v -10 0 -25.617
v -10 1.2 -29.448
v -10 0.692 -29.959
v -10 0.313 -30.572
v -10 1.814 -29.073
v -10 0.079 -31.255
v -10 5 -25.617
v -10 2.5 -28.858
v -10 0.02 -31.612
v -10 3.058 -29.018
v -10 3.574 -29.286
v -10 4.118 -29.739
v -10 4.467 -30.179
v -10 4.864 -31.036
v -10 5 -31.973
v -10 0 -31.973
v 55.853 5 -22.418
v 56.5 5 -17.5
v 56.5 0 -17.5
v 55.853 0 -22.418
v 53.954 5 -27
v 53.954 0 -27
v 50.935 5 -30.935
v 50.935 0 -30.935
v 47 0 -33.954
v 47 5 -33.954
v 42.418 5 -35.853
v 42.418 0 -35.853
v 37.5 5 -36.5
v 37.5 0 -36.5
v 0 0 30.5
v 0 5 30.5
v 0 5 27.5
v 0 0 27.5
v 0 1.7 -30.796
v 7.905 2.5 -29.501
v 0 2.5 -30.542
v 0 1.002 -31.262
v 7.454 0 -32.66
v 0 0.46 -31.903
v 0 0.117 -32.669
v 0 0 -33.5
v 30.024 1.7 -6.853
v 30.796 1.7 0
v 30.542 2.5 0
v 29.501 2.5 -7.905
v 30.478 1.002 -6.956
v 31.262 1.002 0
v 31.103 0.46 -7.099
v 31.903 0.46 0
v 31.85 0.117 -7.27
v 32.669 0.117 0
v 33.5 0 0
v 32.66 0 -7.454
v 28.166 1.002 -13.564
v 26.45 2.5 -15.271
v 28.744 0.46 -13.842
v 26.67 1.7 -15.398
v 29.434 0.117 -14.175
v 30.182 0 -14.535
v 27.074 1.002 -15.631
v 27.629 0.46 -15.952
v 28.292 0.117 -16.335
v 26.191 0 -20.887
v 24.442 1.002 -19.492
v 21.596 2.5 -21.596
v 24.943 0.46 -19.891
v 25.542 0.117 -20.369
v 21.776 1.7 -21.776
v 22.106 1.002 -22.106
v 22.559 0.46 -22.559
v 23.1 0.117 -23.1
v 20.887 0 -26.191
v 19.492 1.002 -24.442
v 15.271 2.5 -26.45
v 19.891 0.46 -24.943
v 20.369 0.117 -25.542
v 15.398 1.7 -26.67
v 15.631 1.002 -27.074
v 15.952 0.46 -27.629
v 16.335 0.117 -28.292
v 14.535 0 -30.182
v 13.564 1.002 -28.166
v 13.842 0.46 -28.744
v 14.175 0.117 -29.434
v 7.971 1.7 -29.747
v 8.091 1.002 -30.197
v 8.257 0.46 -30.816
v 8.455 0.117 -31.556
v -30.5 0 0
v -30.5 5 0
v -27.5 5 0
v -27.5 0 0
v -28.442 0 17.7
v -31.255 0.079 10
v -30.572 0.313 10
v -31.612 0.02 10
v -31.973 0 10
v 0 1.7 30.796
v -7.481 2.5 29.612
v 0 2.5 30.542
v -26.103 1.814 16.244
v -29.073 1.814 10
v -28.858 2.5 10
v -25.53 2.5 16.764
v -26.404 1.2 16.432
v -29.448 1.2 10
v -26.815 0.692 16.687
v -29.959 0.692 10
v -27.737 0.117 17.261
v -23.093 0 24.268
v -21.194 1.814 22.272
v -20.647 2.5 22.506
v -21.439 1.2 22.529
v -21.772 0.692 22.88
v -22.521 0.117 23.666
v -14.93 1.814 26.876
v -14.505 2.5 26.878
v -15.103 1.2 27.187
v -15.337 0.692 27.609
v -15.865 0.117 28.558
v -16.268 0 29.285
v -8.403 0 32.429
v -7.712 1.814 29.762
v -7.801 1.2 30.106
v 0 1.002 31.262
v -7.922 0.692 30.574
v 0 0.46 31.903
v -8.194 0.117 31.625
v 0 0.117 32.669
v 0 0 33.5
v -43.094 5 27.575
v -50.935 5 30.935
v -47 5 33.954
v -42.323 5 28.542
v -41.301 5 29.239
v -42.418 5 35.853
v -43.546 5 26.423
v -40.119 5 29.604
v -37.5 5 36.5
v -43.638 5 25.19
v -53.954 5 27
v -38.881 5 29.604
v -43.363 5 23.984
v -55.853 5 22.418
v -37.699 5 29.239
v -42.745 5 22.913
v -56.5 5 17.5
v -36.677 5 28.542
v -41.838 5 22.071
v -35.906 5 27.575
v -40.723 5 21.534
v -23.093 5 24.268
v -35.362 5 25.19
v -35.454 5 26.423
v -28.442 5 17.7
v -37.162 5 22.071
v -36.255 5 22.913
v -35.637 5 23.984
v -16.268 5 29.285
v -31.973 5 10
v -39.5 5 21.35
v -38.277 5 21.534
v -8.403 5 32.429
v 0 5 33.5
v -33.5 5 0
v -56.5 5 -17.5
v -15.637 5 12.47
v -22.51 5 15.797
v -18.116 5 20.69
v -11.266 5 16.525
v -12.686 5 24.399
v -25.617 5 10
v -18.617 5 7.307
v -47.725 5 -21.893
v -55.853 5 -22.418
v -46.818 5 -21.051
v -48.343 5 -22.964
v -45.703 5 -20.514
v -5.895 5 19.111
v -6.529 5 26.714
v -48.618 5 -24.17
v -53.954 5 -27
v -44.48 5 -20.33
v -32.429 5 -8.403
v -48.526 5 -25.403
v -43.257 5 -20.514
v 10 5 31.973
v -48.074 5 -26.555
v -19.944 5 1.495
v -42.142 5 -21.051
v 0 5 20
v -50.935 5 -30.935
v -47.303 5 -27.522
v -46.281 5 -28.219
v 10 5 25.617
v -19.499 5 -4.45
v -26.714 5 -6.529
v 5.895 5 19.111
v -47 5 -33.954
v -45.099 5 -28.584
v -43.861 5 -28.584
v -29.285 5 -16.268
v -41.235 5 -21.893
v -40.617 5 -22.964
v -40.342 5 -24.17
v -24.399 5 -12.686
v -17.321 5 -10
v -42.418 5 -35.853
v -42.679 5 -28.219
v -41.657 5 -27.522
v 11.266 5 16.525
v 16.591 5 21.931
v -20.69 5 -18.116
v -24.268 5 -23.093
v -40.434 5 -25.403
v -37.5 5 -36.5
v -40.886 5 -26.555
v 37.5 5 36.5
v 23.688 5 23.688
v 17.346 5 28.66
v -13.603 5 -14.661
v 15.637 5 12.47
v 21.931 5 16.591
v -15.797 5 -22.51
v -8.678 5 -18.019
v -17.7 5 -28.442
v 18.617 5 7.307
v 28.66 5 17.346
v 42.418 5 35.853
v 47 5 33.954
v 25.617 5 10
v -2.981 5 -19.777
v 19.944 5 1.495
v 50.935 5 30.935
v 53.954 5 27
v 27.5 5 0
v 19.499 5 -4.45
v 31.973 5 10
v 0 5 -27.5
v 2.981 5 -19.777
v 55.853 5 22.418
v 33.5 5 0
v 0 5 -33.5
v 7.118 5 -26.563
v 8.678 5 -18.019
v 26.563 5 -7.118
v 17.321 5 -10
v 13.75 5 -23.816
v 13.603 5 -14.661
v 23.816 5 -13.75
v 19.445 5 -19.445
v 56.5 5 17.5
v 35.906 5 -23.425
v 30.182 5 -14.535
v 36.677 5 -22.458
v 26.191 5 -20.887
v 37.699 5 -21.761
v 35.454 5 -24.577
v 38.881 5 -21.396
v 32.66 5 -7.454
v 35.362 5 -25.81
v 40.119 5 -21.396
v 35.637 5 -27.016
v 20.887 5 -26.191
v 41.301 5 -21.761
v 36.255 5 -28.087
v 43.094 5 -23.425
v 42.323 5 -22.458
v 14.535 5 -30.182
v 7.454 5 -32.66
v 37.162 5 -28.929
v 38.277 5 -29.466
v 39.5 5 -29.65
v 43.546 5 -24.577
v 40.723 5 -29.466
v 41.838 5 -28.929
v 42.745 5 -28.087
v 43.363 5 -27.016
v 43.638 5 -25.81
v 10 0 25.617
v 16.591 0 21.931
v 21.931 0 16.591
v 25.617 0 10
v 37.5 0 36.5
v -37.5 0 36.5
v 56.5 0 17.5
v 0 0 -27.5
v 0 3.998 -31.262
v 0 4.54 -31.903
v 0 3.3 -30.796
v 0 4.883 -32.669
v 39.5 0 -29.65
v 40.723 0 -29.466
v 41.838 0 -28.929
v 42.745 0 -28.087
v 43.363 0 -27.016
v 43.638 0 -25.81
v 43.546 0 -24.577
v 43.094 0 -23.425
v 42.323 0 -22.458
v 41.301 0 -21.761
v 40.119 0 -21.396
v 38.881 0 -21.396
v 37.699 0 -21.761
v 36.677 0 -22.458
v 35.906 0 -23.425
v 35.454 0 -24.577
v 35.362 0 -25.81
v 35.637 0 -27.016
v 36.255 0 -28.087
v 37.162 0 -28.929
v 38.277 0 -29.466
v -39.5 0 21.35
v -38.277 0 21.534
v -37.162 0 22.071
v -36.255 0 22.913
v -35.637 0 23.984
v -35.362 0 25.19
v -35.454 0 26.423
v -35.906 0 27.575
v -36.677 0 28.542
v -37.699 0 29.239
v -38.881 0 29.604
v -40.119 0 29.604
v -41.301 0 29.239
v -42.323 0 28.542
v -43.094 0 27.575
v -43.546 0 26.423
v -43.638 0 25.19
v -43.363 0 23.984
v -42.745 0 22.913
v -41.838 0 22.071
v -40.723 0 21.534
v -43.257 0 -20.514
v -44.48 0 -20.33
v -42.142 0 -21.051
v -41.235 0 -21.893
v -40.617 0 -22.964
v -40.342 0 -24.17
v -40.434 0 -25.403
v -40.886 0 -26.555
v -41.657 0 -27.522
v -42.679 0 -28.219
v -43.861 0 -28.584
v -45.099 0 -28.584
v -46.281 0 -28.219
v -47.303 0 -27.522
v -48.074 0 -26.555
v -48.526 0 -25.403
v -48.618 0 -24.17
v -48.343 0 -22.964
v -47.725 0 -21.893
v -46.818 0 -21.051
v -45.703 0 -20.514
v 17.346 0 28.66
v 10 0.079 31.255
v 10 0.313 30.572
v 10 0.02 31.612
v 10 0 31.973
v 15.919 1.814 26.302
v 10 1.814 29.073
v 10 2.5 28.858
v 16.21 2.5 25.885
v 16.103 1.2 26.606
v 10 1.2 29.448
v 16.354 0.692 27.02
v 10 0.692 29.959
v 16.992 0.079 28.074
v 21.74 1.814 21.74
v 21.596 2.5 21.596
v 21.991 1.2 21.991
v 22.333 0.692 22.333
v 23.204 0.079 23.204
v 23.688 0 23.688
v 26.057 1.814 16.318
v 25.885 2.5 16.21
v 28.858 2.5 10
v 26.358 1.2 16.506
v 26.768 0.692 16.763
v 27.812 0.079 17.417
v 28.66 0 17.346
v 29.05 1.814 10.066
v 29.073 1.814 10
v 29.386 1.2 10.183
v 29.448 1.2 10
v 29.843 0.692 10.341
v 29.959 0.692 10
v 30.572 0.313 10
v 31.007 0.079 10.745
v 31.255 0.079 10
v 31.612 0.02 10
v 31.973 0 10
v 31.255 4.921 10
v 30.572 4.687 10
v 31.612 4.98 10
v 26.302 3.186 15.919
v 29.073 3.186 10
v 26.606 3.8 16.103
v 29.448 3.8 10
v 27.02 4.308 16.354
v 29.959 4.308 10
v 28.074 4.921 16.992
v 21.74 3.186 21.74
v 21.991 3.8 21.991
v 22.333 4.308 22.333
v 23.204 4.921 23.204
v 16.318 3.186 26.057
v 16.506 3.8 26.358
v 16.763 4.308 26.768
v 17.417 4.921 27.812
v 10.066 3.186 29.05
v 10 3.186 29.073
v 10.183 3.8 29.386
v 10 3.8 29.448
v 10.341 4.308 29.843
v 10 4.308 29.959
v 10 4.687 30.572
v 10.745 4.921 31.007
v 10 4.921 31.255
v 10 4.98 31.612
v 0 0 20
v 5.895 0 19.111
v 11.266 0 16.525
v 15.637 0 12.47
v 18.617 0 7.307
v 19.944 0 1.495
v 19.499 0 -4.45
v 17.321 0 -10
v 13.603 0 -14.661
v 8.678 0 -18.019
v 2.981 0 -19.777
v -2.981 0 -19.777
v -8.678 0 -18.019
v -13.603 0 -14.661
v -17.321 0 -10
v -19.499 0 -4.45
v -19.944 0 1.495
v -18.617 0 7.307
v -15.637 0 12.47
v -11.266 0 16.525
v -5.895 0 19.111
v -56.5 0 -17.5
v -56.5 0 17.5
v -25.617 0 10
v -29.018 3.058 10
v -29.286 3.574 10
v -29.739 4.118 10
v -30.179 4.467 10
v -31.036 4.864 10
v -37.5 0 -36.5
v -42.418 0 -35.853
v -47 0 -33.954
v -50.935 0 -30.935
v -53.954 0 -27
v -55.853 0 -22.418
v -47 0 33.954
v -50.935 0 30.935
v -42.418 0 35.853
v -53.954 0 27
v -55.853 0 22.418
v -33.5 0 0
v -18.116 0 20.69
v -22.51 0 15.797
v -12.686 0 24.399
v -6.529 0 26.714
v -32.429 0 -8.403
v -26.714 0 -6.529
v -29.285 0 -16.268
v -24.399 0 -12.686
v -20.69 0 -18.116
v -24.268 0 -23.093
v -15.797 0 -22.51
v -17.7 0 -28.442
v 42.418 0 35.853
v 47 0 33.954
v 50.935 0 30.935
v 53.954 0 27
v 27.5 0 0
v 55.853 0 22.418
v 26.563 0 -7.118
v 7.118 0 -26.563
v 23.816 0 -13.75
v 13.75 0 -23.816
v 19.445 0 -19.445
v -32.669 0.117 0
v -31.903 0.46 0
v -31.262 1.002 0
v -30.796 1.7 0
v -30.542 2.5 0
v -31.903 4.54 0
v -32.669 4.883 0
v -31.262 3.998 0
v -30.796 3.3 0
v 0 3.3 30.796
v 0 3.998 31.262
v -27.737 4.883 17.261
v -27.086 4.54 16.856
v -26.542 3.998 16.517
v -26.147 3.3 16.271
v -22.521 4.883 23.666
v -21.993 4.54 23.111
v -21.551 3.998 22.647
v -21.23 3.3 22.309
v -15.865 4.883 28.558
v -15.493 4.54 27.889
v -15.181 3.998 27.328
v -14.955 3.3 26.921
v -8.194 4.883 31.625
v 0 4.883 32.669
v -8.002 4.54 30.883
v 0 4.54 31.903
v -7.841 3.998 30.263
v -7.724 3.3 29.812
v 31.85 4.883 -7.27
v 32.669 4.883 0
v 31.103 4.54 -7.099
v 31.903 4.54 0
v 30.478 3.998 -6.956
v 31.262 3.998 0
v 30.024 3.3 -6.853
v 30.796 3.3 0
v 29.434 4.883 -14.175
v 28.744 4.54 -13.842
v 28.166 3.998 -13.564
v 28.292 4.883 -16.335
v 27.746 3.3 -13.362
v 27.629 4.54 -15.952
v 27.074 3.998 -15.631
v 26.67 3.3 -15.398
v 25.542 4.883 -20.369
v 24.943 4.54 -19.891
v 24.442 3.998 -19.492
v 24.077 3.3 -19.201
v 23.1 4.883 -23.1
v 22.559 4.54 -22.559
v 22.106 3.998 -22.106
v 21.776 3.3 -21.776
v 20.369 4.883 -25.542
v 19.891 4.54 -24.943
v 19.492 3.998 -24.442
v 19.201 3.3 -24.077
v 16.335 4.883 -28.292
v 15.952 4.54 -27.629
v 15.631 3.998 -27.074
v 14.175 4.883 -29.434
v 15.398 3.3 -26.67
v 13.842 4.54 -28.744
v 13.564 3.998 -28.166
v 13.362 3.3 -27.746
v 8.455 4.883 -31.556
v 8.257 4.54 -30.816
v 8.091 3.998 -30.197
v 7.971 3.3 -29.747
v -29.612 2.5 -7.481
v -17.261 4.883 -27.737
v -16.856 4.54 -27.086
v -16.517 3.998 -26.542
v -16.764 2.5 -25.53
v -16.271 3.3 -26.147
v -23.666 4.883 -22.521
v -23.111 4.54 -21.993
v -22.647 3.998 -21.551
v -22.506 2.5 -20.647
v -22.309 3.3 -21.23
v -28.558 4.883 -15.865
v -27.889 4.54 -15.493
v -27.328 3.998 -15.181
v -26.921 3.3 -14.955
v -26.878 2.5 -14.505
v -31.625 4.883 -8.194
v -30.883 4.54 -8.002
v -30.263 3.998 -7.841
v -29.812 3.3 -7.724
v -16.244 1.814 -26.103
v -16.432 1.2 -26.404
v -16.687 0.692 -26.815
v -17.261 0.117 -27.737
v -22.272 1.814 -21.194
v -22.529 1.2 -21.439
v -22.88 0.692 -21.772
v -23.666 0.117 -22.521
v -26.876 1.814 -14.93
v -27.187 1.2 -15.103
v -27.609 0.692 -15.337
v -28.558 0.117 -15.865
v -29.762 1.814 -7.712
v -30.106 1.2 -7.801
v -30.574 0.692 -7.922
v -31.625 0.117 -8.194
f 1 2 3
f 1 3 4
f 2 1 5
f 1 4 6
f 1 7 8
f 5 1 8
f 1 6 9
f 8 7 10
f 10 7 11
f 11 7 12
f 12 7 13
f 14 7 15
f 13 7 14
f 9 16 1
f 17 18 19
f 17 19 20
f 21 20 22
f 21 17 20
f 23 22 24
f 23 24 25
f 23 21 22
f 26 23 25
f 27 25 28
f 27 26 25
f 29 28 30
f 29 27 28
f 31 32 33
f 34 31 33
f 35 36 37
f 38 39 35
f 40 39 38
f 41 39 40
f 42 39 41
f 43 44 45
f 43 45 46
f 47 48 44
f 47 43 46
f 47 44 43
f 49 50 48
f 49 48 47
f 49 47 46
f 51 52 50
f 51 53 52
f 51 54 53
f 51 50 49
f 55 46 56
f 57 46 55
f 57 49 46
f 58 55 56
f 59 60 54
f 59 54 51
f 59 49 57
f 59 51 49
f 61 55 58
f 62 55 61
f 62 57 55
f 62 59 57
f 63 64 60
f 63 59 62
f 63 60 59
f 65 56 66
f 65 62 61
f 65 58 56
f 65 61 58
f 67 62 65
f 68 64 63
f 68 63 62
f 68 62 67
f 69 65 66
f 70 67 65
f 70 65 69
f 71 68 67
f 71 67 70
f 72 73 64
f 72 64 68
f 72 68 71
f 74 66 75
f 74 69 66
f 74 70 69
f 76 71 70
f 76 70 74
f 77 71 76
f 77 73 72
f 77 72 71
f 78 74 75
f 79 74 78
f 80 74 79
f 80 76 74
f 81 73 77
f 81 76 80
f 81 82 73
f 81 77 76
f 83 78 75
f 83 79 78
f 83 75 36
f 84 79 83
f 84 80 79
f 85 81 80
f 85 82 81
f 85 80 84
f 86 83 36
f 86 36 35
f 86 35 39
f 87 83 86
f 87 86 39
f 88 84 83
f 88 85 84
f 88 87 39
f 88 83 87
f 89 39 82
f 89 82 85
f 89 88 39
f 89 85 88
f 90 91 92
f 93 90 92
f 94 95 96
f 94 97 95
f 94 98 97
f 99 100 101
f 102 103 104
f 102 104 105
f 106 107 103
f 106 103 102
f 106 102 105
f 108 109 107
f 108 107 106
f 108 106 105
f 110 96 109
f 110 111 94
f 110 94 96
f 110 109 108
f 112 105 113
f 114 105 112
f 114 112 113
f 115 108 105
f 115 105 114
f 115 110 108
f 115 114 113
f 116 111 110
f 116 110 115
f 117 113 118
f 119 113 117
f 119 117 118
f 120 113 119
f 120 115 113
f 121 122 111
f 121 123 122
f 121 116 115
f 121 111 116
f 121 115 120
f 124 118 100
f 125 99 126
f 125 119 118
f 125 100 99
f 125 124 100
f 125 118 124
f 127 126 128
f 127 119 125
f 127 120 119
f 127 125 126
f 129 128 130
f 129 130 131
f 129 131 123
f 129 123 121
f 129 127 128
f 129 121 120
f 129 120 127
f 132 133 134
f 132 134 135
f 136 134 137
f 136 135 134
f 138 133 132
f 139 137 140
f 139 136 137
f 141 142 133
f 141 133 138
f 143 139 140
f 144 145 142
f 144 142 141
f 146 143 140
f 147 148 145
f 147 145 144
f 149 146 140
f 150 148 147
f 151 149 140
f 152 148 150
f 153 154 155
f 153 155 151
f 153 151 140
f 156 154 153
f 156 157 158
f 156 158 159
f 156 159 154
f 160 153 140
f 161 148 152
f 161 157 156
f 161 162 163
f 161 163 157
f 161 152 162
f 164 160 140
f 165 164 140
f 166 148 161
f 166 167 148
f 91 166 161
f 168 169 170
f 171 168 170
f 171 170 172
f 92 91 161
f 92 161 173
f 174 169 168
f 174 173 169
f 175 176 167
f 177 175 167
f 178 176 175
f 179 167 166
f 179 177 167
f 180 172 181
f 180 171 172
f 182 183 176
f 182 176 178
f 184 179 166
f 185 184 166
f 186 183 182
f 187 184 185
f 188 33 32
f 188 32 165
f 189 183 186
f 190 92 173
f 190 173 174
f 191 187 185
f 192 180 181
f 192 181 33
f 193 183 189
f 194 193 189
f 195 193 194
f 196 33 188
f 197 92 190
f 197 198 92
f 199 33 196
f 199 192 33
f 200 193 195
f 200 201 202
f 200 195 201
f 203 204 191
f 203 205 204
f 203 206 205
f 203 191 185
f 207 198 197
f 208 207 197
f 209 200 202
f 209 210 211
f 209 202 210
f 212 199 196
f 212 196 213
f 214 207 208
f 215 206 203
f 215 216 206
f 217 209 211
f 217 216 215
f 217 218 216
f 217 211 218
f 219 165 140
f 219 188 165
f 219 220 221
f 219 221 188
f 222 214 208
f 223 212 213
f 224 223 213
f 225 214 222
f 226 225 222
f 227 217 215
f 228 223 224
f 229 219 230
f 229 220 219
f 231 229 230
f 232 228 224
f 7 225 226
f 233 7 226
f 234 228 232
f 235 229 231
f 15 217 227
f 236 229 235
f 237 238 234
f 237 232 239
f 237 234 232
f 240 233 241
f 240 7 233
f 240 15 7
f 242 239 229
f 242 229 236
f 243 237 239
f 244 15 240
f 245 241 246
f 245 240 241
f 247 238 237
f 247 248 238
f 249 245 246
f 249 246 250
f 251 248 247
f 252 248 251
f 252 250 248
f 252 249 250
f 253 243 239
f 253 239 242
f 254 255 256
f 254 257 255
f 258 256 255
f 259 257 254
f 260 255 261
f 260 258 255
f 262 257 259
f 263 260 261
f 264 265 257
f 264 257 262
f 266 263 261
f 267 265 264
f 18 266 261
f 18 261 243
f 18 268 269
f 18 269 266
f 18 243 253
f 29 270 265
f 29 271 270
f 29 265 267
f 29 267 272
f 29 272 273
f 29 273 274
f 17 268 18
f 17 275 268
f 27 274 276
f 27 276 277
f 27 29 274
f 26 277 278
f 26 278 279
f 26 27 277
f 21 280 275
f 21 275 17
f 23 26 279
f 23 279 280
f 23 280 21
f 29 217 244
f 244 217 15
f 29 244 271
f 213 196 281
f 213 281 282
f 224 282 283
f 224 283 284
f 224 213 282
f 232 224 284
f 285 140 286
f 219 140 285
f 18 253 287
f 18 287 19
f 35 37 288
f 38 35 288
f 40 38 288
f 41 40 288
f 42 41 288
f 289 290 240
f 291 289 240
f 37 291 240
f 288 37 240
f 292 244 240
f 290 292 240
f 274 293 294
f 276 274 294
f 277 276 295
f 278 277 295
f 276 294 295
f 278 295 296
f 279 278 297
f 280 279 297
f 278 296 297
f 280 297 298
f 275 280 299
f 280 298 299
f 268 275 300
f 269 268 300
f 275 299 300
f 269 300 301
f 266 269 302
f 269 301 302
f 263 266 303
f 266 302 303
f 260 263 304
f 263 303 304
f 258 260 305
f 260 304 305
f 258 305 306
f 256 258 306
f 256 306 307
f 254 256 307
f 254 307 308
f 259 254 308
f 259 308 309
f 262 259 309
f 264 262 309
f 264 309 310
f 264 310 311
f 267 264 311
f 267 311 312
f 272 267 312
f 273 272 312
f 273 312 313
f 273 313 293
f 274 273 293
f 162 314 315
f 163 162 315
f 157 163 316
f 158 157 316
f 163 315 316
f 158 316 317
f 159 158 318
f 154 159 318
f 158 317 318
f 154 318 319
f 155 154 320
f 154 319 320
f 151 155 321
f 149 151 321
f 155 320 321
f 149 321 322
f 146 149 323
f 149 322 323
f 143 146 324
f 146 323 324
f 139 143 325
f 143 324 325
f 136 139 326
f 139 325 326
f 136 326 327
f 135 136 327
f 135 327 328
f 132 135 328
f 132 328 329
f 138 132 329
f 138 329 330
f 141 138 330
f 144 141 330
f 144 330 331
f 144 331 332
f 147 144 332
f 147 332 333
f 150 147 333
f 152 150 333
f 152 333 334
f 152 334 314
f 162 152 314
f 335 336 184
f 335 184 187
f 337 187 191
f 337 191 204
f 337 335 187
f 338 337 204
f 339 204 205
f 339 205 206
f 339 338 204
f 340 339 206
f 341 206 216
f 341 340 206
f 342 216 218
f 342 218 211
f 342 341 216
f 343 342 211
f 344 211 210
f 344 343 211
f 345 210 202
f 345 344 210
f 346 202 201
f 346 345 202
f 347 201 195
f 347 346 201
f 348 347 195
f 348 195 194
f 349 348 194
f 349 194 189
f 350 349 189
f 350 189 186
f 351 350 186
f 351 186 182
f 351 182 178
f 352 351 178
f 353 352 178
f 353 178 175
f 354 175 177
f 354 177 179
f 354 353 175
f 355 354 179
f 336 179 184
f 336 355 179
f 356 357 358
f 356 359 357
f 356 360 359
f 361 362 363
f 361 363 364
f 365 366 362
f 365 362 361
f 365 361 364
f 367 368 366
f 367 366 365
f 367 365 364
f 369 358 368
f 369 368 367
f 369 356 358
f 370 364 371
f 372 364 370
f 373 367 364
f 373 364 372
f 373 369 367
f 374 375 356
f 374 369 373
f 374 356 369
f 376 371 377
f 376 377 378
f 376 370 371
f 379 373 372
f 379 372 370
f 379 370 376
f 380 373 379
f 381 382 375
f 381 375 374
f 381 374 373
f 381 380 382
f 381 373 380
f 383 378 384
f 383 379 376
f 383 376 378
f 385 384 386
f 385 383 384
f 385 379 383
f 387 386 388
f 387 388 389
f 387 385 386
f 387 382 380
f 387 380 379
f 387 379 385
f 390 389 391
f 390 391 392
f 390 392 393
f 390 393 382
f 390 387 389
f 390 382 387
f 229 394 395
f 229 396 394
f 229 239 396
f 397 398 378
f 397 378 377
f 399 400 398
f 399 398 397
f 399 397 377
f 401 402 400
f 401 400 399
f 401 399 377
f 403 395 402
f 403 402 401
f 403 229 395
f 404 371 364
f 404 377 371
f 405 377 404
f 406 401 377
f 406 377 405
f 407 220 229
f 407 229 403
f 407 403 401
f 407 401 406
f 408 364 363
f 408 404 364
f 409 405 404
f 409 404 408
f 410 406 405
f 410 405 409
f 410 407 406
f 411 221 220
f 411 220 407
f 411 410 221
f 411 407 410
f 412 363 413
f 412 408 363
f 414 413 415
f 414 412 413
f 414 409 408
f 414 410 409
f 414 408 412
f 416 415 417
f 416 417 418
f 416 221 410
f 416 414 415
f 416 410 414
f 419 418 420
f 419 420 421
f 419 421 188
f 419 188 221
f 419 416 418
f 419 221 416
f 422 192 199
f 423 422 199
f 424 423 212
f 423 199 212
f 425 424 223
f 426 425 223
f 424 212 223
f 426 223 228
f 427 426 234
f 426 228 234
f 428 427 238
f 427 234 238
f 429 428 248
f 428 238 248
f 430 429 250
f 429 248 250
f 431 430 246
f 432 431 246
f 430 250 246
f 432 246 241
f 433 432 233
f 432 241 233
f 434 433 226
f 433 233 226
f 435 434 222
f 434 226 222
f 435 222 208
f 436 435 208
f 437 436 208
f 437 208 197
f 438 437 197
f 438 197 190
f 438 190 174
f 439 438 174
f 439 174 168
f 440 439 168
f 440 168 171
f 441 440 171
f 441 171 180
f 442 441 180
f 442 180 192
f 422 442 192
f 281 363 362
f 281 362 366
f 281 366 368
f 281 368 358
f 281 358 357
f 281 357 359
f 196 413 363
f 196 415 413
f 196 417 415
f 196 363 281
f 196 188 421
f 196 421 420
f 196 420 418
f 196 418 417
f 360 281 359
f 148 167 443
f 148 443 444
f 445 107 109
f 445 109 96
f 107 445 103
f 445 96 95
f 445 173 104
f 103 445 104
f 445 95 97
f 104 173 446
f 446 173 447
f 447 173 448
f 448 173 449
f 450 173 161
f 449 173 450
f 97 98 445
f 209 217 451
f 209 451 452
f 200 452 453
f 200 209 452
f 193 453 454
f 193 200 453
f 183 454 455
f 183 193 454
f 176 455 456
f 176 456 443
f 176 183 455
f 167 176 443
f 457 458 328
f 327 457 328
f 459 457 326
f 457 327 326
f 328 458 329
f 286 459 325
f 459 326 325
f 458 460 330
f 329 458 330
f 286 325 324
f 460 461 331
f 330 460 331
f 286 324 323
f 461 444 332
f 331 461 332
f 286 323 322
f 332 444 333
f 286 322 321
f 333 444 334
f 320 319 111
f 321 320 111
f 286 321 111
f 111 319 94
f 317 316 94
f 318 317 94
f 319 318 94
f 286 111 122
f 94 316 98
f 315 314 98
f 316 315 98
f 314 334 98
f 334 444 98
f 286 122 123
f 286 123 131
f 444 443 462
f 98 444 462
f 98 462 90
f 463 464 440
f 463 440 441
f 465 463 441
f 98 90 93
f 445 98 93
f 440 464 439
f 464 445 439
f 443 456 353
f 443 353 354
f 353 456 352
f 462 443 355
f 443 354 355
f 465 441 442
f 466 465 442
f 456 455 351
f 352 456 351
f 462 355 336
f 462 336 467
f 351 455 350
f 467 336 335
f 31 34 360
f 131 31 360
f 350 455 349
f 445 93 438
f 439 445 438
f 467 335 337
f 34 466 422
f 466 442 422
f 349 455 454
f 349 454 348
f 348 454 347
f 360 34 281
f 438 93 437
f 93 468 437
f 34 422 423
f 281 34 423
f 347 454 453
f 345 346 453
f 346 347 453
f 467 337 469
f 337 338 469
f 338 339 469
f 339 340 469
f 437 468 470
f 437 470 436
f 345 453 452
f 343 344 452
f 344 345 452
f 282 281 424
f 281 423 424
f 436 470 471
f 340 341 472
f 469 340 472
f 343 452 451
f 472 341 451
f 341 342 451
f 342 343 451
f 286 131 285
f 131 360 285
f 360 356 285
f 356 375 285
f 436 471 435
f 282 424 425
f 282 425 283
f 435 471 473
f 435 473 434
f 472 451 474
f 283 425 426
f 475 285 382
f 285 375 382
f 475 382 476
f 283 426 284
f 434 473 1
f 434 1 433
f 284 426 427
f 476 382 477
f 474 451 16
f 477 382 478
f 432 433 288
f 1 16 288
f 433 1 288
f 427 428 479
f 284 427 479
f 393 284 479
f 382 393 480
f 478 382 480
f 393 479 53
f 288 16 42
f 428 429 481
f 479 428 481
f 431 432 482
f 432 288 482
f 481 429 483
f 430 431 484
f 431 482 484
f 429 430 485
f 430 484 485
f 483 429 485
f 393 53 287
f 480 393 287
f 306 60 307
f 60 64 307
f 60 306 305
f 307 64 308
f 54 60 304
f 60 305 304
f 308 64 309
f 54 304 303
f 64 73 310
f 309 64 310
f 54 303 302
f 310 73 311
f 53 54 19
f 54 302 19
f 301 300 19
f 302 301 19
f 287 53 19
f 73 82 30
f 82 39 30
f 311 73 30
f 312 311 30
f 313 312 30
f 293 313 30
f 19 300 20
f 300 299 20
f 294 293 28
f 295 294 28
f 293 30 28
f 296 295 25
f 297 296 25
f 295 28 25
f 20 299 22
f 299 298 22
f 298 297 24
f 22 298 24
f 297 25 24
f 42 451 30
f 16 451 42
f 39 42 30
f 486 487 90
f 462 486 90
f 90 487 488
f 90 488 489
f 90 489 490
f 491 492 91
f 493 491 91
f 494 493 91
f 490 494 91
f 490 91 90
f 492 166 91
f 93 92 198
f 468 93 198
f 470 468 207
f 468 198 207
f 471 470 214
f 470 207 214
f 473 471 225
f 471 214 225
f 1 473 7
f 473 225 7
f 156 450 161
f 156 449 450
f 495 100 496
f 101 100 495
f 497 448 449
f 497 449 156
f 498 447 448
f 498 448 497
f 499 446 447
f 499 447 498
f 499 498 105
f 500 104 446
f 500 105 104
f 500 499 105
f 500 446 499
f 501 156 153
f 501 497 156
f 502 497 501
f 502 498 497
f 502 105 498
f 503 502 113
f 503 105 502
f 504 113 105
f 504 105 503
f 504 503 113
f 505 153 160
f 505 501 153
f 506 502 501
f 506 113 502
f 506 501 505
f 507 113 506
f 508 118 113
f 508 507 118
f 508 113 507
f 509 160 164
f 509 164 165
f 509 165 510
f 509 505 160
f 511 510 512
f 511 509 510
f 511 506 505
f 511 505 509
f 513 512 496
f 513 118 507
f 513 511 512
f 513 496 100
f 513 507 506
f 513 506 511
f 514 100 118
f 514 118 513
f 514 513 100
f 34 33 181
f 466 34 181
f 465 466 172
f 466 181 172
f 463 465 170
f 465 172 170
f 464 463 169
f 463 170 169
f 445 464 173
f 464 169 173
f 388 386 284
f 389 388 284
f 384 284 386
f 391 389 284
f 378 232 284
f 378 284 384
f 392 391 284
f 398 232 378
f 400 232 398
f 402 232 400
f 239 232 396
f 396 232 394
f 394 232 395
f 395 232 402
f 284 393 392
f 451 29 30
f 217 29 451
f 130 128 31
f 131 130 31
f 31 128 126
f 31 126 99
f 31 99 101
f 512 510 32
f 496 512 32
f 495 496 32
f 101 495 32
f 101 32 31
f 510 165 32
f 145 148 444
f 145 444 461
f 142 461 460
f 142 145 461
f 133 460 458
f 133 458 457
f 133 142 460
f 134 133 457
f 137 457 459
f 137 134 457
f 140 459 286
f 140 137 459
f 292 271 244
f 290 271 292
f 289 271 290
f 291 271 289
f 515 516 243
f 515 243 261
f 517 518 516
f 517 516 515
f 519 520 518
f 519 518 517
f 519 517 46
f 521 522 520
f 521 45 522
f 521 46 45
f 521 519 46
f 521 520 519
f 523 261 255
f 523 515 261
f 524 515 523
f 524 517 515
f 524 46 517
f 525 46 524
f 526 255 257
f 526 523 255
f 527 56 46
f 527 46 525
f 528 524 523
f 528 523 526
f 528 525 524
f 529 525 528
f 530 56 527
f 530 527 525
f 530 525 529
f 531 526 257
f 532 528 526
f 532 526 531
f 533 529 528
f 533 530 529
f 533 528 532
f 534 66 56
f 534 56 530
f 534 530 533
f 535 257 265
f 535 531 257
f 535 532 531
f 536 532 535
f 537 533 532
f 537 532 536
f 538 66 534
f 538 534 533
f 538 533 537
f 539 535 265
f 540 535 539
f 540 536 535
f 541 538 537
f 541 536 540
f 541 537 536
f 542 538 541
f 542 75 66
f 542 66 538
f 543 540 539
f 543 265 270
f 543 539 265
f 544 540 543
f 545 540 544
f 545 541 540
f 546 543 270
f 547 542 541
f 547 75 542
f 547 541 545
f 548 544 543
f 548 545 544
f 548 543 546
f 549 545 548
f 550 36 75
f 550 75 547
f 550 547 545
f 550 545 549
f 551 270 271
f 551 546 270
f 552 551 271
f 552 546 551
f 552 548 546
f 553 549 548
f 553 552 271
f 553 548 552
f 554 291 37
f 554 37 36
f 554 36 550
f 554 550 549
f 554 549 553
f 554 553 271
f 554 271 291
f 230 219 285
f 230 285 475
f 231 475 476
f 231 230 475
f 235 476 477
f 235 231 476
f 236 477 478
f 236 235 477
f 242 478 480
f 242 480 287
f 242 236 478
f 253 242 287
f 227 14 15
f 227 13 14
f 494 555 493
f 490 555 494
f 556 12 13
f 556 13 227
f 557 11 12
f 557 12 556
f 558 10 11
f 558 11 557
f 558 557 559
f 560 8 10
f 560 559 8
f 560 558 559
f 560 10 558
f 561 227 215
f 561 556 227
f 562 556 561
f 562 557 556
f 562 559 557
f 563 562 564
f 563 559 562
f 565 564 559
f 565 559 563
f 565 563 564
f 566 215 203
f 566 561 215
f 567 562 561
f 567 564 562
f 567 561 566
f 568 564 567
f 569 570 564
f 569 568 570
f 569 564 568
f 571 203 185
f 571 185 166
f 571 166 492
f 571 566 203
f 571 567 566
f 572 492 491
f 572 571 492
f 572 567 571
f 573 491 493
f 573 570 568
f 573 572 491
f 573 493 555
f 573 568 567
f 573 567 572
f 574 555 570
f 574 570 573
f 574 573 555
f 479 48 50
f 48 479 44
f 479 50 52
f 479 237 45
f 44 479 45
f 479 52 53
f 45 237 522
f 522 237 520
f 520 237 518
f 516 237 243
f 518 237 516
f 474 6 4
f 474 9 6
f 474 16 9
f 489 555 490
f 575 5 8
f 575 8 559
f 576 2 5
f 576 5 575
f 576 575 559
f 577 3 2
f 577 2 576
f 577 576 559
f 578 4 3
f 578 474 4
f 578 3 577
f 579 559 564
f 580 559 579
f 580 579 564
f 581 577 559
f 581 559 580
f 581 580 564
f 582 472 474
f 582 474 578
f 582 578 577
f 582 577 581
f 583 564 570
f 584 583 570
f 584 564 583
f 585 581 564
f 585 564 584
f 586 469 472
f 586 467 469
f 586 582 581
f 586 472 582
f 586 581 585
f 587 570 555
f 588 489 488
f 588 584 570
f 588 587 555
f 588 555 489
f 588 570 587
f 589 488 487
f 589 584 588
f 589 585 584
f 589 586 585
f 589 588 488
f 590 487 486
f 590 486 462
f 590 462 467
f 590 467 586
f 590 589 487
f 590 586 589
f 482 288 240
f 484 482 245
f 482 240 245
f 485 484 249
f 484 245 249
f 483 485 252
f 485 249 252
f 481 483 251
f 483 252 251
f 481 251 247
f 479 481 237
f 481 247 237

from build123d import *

# Parameters (mm, degrees)
SKETCH1_W           = 115
SKETCH1_H           = 75
SKETCH1_R           = 4.15
BOSS_EXTRUDE1_DEPTH = 5
FILLET1_R           = 20
SKETCH5_R           = 4.15
CUT_EXTRUDE4_DEPTH  = 10
CUT_EXTRUDE7_DEPTH  = 16
SKETCH12_R          = 20
CUT_EXTRUDE8_DEPTH  = 10
FILLET2_R           = 3


with BuildPart() as part:
    # Sketch1 → Boss-Extrude1 (new body)
    with BuildSketch(Plane(origin=(0, 0, 0), x_dir=(1, 0, 0), z_dir=(0, 1, 0))):
        Rectangle(SKETCH1_W, SKETCH1_H)
        with Locations(Location((-44.48, 24.48, 0), (0, 0, 270))):
            Circle(SKETCH1_R, mode=Mode.SUBTRACT)
    extrude(amount=BOSS_EXTRUDE1_DEPTH)

    # Fillet1
    fillet1_edges = [part.edges().sort_by_distance(p)[0] for p in [
        (57.5, 2.5, 37.5),
        (-57.5, 2.5, 37.5),
        (-57.5, 2.5, -37.5),
        (57.5, 2.5, -37.5),
    ]]
    fillet(fillet1_edges, radius=FILLET1_R)

    # Sketch5 → Cut-Extrude4 (cut)
    with BuildSketch(Plane.XZ):
        with Locations(Location((-39.5, 25.5, 0), (0, 0, 270))):
            Circle(SKETCH5_R)
        with Locations(Location((39.5, -25.5, 0), (0, 0, 270))):
            Circle(SKETCH5_R)
    extrude(amount=-CUT_EXTRUDE4_DEPTH, mode=Mode.SUBTRACT)

    # Sketch11 → Cut-Extrude7 (cut)
    with BuildSketch(Plane(origin=(0, 5, 0), x_dir=(1, 0, 0), z_dir=(0, 1, 0))):
        with BuildLine():
            Line((57.5, -17.5), (57.5, 17.5))
            ThreePointArc((57.5, 17.5), (51.642135624, 31.642135624), (37.5, 37.5))
            Line((37.5, 37.5), (-37.5, 37.5))
            ThreePointArc((-37.5, 37.5), (-51.642135624, 31.642135624), (-57.5, 17.5))
            Line((-57.5, 17.5), (-57.5, -17.5))
            ThreePointArc((-57.5, -17.5), (-51.642135624, -31.642135624), (-37.5, -37.5))
            Line((-37.5, -37.5), (37.5, -37.5))
            ThreePointArc((37.5, -37.5), (51.642135624, -31.642135624), (57.5, -17.5))
        make_face()
        with BuildLine():
            Line((37.5, 36.5), (-37.5, 36.5))
            ThreePointArc((-37.5, 36.5), (-50.935028843, 30.935028843), (-56.5, 17.5))
            Line((-56.5, 17.5), (-56.5, -17.5))
            ThreePointArc((-56.5, -17.5), (-50.935028843, -30.935028843), (-37.5, -36.5))
            Line((-37.5, -36.5), (37.5, -36.5))
            ThreePointArc((37.5, -36.5), (50.935028843, -30.935028843), (56.5, -17.5))
            Line((56.5, -17.5), (56.5, 17.5))
            ThreePointArc((56.5, 17.5), (50.935028843, 30.935028843), (37.5, 36.5))
        make_face(mode=Mode.SUBTRACT)
    extrude(amount=-CUT_EXTRUDE7_DEPTH, mode=Mode.SUBTRACT)

    # Sketch12 → Cut-Extrude8 (cut)
    with BuildSketch(Plane(origin=(0, 5, 0), x_dir=(1, 0, 0), z_dir=(0, 1, 0))):
        with Locations(Location((0, 0, 0), (0, 0, 270))):
            Circle(SKETCH12_R)
        with BuildLine():
            Line((0, 30.5), (0, 27.5))
            ThreePointArc((0, 27.5), (19.445436483, 19.445436483), (27.5, 0))
            Line((27.5, 0), (30.5, 0))
            ThreePointArc((30.5, 0), (21.566756826, 21.566756826), (0, 30.5))
        make_face()
        with BuildLine():
            Line((-30.5, 0), (-27.5, 0))
            ThreePointArc((-27.5, 0), (-22.707377656, 15.512092057), (-10, 25.617376915))
            Line((-10, 25.617376915), (-10, 28.814059068))
            ThreePointArc((-10, 28.814059068), (-24.852062289, 17.68120471), (-30.5, 0))
        make_face()
        with BuildLine():
            Line((0, -30.5), (0, -27.5))
            ThreePointArc((0, -27.5), (-15.512092057, -22.707377656), (-25.617376915, -10))
            Line((-25.617376915, -10), (-28.814059068, -10))
            ThreePointArc((-28.814059068, -10), (-17.68120471, -24.852062289), (0, -30.5))
        make_face()
        with BuildLine():
            Line((25.617376915, -10), (28.814059068, -10))
            ThreePointArc((28.814059068, -10), (21.566756826, -21.566756826), (10, -28.814059068))
            Line((10, -28.814059068), (10, -25.617376915))
            ThreePointArc((10, -25.617376915), (19.445436483, -19.445436483), (25.617376915, -10))
        make_face()
    extrude(amount=-CUT_EXTRUDE8_DEPTH, mode=Mode.SUBTRACT)

    # Fillet2
    # the kernel refuses this fillet: 3 mm, written as the material it takes off along each edge
    with BuildSketch(Plane(origin=(0, 0, 0), x_dir=(-0.9961231139534353, 0, 0.08797011906159574), z_dir=(-0.08797011906159574, 0, -0.9961231139534353))) as fillet2_piece_1_section:
        with BuildLine():
            CenterArc((30.5 + FILLET2_R, FILLET2_R), FILLET2_R, 180, 90)
            Line((30.5, FILLET2_R), (30.5, 0))
            Line((30.5, 0), (30.5 + FILLET2_R, 0))
        make_face()
    fillet2_piece_1 = revolve(axis=Axis((0, 0, 0), (0, 1, 0)), revolution_arc=84.953159759, mode=Mode.PRIVATE)
    fillet2_piece_1 = split(fillet2_piece_1, bisect_by=Plane(origin=(-18.564957711, 0.847104703, 10), z_dir=(0, 0, 1)), keep=Keep.TOP, mode=Mode.PRIVATE)
    add(fillet2_piece_1, mode=Mode.SUBTRACT)
    with BuildSketch(Plane(origin=(0, 0, 0), x_dir=(-0.08797011906159563, 0, -0.9961231139534353), z_dir=(0.9961231139534353, 0, -0.08797011906159563))) as fillet2_piece_2_section:
        with BuildLine():
            CenterArc((30.5 + FILLET2_R, FILLET2_R), FILLET2_R, 180, 90)
            Line((30.5, FILLET2_R), (30.5, 0))
            Line((30.5, 0), (30.5 + FILLET2_R, 0))
        make_face()
    fillet2_piece_2 = revolve(axis=Axis((0, 0, 0), (0, 1, 0)), revolution_arc=84.953159759, mode=Mode.PRIVATE)
    fillet2_piece_2 = split(fillet2_piece_2, bisect_by=Plane(origin=(-10, 0.847104703, -18.564957711), z_dir=(-1, 0, 0)), keep=Keep.TOP, mode=Mode.PRIVATE)
    add(fillet2_piece_2, mode=Mode.SUBTRACT)
    with BuildSketch(Plane(origin=(0, 0, 0), x_dir=(1, 0, 0), z_dir=(0, 0, 1))) as fillet2_piece_3:
        with BuildLine():
            CenterArc((30.5 + FILLET2_R, FILLET2_R), FILLET2_R, 180, 90)
            Line((30.5, FILLET2_R), (30.5, 0))
            Line((30.5, 0), (30.5 + FILLET2_R, 0))
        make_face()
    revolve(axis=Axis((0, 0, 0), (0, 1, 0)), revolution_arc=90, mode=Mode.SUBTRACT)
    with BuildSketch(Plane(origin=(0, 0, 0), x_dir=(0.08799861930970912, 0, 0.9961205966144786), z_dir=(-0.9961205966144786, 0, 0.08799861930970912))) as fillet2_piece_4_section:
        with BuildLine():
            CenterArc((30.5 + FILLET2_R, FILLET2_R), FILLET2_R, 180, 90)
            Line((30.5, FILLET2_R), (30.5, 0))
            Line((30.5, 0), (30.5 + FILLET2_R, 0))
        make_face()
    fillet2_piece_4 = revolve(axis=Axis((0, 0, 0), (0, 1, 0)), revolution_arc=79.903040915, mode=Mode.PRIVATE)
    fillet2_piece_4 = split(fillet2_piece_4, bisect_by=Plane(origin=(10, 0.85015092, 22.167904307), z_dir=(1, 0, 0)), keep=Keep.TOP, mode=Mode.PRIVATE)
    fillet2_piece_4 = split(fillet2_piece_4, bisect_by=Plane(origin=(22.167904307, 0.85015092, 10), z_dir=(0, 0, 1)), keep=Keep.TOP, mode=Mode.PRIVATE)
    add(fillet2_piece_4, mode=Mode.SUBTRACT)
    with BuildSketch(Plane(origin=(0, 5, 0), x_dir=(-0.9961231139534353, 0, 0.08797011906159574), z_dir=(-0.08797011906159574, 0, -0.9961231139534353))) as fillet2_piece_5_section:
        with BuildLine():
            CenterArc((30.5 + FILLET2_R, -FILLET2_R), FILLET2_R, 90, 90)
            Line((30.5 + FILLET2_R, 0), (30.5, 0))
            Line((30.5, 0), (30.5, -FILLET2_R))
        make_face()
    fillet2_piece_5 = revolve(axis=Axis((0, 5, 0), (0, 1, 0)), revolution_arc=84.953159759, mode=Mode.PRIVATE)
    fillet2_piece_5 = split(fillet2_piece_5, bisect_by=Plane(origin=(-18.564957711, 4.152895297, 10), z_dir=(0, 0, 1)), keep=Keep.TOP, mode=Mode.PRIVATE)
    add(fillet2_piece_5, mode=Mode.SUBTRACT)
    with BuildSketch(Plane(origin=(0, 5, 0), x_dir=(-0.08797011906159553, 0, -0.9961231139534353), z_dir=(0.9961231139534353, 0, -0.08797011906159553))) as fillet2_piece_6_section:
        with BuildLine():
            CenterArc((30.5 + FILLET2_R, -FILLET2_R), FILLET2_R, 90, 90)
            Line((30.5 + FILLET2_R, 0), (30.5, 0))
            Line((30.5, 0), (30.5, -FILLET2_R))
        make_face()
    fillet2_piece_6 = revolve(axis=Axis((0, 5, 0), (0, 1, 0)), revolution_arc=84.953159759, mode=Mode.PRIVATE)
    fillet2_piece_6 = split(fillet2_piece_6, bisect_by=Plane(origin=(-10, 4.152895297, -18.564957711), z_dir=(-1, 0, 0)), keep=Keep.TOP, mode=Mode.PRIVATE)
    add(fillet2_piece_6, mode=Mode.SUBTRACT)
    with BuildSketch(Plane(origin=(0, 5, 0), x_dir=(0.9961205966144787, 0, 0.08799861930970913), z_dir=(0.08799861930970913, 0, -0.9961205966144787))) as fillet2_piece_7_section:
        with BuildLine():
            CenterArc((30.5 + FILLET2_R, FILLET2_R), FILLET2_R, 180, 90)
            Line((30.5 + FILLET2_R, 0), (30.5, 0))
            Line((30.5, 0), (30.5, FILLET2_R))
        make_face()
    fillet2_piece_7 = revolve(axis=Axis((0, 5, 0), (0, -1, 0)), revolution_arc=79.903040915, mode=Mode.PRIVATE)
    fillet2_piece_7 = split(fillet2_piece_7, bisect_by=Plane(origin=(10, 4.149849079, 22.167904307), z_dir=(1, 0, 0)), keep=Keep.TOP, mode=Mode.PRIVATE)
    fillet2_piece_7 = split(fillet2_piece_7, bisect_by=Plane(origin=(22.167904307, 4.149849079, 10), z_dir=(0, 0, 1)), keep=Keep.TOP, mode=Mode.PRIVATE)
    add(fillet2_piece_7, mode=Mode.SUBTRACT)
    with BuildSketch(Plane(origin=(0, 5, 0), x_dir=(1, 0, 0), z_dir=(0, 0, 1))) as fillet2_piece_8:
        with BuildLine():
            CenterArc((30.5 + FILLET2_R, -FILLET2_R), FILLET2_R, 90, 90)
            Line((30.5 + FILLET2_R, 0), (30.5, 0))
            Line((30.5, 0), (30.5, -FILLET2_R))
        make_face()
    revolve(axis=Axis((0, 5, 0), (0, 1, 0)), revolution_arc=90, mode=Mode.SUBTRACT)


solid = part.part
